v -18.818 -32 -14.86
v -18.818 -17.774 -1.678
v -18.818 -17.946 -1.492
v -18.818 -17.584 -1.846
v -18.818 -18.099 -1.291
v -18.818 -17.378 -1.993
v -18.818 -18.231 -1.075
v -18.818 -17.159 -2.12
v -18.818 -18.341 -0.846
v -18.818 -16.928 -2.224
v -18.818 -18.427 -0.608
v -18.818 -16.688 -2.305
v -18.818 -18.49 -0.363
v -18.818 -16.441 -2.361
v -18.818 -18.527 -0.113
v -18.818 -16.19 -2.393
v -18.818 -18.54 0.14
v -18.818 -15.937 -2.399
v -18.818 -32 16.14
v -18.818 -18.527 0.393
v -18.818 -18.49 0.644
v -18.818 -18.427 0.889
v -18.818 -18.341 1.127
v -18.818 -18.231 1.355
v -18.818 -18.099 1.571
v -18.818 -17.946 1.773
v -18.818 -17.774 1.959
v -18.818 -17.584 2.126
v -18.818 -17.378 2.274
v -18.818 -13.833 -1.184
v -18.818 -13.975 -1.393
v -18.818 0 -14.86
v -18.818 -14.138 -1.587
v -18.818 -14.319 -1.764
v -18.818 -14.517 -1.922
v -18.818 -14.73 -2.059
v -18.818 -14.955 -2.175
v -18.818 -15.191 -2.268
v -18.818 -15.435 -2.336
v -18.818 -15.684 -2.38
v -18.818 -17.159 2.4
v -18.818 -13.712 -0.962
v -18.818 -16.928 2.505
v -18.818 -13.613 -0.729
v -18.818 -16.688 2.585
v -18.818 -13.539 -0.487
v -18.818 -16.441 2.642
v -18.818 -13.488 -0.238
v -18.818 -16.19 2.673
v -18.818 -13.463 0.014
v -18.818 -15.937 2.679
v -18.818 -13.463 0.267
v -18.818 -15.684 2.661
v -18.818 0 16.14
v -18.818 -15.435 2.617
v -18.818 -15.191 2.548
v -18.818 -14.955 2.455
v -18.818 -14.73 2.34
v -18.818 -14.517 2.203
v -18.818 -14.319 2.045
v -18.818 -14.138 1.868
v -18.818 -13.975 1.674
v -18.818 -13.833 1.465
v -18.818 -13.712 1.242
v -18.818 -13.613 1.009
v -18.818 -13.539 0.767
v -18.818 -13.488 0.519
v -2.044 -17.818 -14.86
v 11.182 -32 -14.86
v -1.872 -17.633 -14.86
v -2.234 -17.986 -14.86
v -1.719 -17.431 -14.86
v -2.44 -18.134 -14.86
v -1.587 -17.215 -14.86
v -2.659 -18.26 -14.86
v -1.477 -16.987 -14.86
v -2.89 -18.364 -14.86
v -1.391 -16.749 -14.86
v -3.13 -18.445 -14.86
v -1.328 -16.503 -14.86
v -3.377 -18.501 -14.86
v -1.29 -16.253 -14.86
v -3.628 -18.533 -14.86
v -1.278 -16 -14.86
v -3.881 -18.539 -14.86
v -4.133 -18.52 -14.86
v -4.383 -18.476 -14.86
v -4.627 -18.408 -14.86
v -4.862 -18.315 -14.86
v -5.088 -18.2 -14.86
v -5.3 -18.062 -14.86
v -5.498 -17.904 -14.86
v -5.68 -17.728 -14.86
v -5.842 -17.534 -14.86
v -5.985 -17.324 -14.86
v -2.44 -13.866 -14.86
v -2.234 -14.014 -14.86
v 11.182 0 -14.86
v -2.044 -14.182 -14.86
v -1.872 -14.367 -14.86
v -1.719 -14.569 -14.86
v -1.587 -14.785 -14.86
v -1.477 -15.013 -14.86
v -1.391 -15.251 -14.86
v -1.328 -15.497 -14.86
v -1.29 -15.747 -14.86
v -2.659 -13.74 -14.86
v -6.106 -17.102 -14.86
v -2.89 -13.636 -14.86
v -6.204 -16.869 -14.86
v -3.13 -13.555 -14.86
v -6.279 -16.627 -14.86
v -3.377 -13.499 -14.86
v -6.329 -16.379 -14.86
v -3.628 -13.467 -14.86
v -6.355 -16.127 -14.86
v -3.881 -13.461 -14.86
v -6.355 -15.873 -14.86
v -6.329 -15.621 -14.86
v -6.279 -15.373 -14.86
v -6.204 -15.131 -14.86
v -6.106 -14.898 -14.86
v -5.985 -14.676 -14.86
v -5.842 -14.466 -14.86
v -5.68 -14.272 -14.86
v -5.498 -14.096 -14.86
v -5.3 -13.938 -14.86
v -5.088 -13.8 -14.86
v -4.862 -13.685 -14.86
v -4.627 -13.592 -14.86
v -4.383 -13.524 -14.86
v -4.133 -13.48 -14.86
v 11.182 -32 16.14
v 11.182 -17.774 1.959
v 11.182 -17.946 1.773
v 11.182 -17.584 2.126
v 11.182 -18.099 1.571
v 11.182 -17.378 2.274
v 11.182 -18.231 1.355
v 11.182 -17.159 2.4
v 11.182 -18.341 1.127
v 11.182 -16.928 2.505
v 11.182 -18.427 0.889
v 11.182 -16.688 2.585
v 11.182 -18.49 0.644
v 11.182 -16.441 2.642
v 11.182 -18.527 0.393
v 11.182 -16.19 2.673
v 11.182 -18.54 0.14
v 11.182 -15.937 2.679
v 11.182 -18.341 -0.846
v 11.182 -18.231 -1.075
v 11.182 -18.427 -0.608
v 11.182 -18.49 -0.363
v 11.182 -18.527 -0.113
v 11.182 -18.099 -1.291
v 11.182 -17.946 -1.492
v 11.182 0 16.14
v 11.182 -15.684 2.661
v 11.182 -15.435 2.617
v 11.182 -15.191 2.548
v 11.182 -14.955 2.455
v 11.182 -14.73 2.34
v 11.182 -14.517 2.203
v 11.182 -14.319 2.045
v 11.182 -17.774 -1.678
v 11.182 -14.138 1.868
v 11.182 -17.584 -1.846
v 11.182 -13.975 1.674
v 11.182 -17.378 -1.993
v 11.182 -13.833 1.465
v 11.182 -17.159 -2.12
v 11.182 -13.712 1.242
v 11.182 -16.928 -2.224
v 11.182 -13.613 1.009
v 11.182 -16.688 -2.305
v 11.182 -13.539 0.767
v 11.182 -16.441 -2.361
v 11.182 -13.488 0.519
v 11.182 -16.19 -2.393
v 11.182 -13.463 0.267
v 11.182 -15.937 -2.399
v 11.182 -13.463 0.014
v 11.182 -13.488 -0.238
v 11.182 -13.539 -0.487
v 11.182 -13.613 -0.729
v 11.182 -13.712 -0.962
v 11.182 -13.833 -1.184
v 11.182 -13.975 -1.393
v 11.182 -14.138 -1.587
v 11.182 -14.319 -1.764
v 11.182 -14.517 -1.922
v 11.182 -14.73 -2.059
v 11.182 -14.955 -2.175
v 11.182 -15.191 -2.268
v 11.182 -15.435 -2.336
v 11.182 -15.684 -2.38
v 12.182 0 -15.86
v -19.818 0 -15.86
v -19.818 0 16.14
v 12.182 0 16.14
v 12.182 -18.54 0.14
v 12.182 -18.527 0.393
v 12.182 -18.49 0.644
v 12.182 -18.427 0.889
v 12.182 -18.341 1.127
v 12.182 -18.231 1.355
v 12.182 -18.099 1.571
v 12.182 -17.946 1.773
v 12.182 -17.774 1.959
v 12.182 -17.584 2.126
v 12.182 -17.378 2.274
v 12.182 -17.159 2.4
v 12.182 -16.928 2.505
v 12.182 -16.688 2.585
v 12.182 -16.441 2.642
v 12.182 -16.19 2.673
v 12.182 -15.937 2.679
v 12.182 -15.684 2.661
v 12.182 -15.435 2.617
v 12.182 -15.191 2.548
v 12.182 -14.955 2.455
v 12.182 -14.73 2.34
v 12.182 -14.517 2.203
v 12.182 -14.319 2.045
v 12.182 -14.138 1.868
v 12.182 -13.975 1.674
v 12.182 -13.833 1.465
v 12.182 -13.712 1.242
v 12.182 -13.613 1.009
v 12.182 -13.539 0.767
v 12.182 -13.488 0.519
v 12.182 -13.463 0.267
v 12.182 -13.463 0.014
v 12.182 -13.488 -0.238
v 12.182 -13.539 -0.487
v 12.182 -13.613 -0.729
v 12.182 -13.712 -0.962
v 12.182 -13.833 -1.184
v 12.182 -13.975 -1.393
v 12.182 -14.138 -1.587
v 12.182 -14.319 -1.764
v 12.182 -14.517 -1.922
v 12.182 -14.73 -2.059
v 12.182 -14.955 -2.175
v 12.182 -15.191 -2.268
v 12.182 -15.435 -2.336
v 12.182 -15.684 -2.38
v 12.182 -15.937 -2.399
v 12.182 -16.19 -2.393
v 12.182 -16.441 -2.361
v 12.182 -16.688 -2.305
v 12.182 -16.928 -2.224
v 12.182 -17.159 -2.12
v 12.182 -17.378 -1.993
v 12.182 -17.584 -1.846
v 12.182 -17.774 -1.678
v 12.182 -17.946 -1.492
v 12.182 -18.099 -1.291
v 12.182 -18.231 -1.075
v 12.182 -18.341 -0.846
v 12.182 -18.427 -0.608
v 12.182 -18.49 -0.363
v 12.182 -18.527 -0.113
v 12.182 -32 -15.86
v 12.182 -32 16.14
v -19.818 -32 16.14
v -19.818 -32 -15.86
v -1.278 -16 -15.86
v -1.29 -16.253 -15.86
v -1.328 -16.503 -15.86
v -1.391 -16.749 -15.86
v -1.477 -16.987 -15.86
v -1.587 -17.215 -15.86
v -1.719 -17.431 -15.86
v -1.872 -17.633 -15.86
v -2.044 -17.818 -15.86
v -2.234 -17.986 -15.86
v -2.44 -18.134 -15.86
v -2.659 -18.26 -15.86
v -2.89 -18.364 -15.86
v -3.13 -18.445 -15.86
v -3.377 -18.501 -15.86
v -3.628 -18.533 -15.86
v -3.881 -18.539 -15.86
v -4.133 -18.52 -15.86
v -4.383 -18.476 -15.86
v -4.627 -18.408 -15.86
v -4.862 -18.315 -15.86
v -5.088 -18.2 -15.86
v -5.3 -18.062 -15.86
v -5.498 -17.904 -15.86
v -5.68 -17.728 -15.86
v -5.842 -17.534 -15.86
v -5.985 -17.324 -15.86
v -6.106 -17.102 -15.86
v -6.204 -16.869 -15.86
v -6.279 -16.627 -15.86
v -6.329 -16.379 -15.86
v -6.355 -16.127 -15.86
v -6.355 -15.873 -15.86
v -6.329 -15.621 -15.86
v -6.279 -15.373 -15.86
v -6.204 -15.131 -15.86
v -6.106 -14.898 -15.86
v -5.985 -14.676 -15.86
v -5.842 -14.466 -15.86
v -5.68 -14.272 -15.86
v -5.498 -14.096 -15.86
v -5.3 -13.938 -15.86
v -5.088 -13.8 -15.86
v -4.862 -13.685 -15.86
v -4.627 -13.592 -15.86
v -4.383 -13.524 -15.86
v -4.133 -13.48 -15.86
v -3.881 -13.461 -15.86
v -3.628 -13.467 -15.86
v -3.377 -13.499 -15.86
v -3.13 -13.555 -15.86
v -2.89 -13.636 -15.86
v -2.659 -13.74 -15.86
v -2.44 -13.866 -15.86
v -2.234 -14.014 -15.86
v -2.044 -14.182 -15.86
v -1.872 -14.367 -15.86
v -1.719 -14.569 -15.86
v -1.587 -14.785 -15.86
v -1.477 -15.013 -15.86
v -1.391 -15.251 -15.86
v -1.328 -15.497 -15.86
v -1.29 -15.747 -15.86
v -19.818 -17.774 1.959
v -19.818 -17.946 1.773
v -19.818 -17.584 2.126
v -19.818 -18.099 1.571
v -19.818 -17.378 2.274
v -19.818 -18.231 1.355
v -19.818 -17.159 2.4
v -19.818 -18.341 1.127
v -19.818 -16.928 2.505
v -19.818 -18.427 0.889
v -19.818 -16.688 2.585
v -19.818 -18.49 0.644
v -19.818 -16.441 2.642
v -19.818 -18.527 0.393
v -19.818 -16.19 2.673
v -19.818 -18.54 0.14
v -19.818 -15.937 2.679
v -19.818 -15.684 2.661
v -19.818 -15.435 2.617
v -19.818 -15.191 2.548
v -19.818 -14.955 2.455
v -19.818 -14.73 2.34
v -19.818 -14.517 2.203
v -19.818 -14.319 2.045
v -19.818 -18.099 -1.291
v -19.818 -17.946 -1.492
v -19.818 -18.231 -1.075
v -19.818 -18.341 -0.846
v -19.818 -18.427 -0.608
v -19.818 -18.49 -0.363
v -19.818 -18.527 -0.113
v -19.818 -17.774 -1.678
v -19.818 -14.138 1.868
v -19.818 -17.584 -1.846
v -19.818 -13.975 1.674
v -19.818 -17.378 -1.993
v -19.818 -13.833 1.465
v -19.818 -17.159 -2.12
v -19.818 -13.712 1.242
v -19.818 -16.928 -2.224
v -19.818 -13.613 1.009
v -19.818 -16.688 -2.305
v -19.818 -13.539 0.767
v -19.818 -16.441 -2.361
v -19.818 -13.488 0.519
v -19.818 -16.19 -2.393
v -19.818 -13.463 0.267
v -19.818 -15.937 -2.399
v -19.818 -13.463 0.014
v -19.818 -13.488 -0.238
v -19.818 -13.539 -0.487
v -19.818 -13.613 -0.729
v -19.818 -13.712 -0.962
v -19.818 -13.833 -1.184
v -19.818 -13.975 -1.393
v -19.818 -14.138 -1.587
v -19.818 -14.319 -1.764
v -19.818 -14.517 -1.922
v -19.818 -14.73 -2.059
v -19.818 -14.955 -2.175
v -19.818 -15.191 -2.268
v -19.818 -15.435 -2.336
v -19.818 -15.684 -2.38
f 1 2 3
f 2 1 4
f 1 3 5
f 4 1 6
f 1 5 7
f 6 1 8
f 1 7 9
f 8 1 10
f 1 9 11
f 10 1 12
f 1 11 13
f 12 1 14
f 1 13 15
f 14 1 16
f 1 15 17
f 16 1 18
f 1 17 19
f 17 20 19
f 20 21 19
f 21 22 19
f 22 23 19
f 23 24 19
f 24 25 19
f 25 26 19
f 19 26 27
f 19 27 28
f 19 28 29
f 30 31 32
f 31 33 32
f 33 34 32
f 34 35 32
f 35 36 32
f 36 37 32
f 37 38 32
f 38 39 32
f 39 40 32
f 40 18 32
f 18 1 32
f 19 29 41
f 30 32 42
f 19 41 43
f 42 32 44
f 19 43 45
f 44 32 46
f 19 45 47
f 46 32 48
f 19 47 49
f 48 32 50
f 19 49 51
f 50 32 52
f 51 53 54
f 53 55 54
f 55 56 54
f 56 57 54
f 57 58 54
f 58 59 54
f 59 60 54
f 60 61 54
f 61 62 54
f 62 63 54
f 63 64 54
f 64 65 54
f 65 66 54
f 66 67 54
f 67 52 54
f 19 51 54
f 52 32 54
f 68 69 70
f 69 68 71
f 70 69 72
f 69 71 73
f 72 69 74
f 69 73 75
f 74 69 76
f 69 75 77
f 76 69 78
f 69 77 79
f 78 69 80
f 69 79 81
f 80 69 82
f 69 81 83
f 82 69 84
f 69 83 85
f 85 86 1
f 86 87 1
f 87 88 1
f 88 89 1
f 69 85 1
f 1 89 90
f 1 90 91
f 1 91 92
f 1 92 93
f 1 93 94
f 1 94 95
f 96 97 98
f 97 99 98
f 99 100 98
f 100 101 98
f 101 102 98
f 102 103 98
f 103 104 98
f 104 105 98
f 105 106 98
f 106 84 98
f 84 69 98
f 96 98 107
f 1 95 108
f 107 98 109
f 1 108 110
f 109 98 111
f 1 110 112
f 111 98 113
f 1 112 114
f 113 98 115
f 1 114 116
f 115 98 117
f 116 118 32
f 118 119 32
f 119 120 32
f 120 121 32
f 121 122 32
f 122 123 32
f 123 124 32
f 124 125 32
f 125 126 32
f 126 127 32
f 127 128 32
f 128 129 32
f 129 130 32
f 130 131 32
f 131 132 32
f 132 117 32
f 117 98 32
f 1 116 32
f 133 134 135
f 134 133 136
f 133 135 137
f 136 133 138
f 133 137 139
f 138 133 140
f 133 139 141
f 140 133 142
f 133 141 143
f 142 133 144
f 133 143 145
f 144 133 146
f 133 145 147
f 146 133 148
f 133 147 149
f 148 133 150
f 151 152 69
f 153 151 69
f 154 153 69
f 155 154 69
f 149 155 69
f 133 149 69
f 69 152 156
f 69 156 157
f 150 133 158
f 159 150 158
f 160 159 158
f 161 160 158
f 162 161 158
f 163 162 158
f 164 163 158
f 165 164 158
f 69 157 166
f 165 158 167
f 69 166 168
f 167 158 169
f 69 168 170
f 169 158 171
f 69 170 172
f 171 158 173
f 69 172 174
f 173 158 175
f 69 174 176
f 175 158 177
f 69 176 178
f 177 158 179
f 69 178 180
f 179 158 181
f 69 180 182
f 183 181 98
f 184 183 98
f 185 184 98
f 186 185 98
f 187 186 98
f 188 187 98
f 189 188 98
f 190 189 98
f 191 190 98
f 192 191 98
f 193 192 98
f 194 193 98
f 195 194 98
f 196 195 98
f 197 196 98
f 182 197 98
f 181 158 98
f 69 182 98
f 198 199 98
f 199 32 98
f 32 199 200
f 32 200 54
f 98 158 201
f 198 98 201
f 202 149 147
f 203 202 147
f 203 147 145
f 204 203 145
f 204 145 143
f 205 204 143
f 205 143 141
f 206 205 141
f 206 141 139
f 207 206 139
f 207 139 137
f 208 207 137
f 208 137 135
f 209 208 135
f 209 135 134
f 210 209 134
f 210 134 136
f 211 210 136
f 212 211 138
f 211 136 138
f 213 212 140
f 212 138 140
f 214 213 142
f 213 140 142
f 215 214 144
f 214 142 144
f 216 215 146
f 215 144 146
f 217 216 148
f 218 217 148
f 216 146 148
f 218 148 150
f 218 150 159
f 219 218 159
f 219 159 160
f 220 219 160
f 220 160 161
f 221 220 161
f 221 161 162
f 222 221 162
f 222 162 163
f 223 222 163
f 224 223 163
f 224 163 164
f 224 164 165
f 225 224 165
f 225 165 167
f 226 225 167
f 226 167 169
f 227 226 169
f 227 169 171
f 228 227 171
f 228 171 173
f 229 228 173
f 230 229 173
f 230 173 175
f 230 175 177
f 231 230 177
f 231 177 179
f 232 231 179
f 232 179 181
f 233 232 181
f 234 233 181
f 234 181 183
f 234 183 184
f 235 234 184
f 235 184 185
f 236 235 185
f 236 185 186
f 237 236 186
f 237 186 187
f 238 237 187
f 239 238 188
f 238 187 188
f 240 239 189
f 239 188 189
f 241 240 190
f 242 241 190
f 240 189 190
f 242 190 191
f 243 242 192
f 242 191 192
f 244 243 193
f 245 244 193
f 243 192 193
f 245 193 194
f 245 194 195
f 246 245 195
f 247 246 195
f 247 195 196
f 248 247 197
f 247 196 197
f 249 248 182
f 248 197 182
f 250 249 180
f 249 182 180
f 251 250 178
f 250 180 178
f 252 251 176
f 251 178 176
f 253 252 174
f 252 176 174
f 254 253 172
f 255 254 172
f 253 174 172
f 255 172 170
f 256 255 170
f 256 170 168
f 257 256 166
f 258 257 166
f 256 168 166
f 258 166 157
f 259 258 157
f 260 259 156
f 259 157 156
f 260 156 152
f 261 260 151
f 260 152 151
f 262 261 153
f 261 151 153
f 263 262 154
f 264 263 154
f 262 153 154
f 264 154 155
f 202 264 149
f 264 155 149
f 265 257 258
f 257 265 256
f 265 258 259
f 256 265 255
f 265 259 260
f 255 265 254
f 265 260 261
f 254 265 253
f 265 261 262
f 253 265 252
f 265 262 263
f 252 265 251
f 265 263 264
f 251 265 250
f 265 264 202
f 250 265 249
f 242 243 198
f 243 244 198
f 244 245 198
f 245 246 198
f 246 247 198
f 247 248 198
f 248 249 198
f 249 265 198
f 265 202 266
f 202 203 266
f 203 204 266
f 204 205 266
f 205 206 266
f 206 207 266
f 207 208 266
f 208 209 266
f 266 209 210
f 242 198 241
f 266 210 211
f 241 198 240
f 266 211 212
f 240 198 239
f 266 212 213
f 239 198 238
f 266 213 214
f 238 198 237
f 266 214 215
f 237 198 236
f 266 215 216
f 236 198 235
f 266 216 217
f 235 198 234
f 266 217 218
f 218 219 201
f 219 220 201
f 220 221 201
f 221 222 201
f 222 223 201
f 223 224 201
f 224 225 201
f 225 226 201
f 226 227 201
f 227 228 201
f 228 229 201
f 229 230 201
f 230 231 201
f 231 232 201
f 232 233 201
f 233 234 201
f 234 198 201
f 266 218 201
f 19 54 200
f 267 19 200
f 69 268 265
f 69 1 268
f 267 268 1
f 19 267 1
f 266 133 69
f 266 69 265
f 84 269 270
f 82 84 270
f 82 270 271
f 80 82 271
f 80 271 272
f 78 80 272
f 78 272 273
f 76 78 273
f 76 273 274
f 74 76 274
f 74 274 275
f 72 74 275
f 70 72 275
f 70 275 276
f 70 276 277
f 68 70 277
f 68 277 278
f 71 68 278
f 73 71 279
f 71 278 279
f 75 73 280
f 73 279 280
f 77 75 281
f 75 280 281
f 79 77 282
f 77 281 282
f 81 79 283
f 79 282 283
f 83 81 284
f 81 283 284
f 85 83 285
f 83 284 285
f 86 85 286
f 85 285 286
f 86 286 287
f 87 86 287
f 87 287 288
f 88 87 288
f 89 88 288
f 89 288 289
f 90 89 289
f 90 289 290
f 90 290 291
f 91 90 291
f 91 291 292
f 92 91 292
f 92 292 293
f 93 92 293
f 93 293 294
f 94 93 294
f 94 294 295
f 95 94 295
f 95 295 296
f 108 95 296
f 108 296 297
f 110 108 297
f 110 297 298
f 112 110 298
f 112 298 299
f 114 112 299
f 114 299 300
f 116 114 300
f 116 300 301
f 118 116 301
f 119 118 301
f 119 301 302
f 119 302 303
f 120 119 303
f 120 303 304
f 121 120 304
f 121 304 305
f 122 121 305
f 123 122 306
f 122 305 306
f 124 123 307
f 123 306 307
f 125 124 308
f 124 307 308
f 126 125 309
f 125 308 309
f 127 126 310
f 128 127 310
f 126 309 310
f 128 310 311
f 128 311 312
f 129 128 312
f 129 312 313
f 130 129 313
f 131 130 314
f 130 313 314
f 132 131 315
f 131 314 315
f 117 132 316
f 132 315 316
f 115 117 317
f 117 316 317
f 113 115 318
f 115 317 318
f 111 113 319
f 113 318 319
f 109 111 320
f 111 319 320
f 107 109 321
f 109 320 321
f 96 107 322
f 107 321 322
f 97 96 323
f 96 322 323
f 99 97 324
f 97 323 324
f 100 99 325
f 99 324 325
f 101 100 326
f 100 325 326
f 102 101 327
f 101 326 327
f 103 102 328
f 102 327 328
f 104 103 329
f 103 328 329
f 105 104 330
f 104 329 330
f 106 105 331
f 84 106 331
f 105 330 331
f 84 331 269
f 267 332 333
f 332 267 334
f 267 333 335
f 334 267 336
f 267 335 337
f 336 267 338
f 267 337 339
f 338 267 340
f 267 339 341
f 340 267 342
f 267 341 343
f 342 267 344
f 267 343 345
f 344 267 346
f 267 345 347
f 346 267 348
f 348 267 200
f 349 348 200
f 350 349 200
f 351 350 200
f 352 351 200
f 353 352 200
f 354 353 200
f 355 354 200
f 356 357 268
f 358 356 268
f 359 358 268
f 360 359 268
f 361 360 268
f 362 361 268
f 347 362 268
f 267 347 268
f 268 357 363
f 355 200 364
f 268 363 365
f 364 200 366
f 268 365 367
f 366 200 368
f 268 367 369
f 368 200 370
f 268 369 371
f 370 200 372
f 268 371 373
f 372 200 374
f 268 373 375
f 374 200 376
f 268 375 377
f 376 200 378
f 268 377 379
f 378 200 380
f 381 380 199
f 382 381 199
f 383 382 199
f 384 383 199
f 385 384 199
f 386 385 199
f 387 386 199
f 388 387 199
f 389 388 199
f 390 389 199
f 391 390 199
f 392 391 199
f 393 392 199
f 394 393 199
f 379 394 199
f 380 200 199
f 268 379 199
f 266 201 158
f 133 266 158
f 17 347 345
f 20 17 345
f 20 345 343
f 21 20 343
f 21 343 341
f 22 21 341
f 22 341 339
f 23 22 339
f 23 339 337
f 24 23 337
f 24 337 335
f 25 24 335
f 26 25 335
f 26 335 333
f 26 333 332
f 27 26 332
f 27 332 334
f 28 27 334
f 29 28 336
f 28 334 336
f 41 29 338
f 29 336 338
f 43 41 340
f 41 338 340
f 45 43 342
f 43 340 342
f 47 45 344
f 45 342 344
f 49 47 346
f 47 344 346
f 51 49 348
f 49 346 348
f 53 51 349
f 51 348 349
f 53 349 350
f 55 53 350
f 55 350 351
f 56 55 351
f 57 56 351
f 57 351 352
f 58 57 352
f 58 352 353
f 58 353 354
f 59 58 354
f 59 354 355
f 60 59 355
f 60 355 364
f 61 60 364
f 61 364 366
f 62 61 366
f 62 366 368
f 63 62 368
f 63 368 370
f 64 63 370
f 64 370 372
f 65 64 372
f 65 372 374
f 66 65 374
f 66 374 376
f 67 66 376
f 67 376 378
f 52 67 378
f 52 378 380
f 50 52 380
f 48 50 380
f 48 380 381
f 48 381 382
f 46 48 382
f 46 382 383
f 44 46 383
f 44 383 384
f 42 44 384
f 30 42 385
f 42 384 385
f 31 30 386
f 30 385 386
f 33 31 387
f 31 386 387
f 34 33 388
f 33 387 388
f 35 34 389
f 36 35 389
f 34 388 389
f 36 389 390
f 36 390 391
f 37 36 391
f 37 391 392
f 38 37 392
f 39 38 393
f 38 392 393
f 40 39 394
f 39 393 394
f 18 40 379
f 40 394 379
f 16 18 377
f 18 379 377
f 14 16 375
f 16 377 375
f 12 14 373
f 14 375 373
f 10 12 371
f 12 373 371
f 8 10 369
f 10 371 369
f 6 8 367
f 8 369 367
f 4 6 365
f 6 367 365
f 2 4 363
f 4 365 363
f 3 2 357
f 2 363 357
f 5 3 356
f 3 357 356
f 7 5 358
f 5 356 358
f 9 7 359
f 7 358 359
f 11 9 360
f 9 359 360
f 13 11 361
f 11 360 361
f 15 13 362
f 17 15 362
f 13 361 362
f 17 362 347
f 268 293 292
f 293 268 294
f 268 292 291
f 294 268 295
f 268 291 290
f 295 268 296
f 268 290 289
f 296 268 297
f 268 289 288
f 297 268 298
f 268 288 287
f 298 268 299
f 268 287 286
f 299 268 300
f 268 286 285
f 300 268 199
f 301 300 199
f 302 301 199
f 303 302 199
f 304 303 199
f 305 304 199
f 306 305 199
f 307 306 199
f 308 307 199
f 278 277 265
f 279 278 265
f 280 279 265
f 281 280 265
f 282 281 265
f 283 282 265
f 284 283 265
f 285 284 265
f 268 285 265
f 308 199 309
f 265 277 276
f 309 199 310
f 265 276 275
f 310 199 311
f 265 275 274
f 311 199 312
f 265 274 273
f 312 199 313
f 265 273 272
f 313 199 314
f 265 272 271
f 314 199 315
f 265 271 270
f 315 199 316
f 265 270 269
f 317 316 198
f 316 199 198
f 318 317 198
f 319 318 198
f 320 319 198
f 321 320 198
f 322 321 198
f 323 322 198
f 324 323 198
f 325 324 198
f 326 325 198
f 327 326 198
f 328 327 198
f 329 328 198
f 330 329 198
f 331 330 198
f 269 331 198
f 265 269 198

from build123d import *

# Parameters (mm, degrees)
F1_DEPTH = 32
F2_R     = 2.54
F3_DEPTH = 76.2
F4_R     = 2.54
F5_DEPTH = 25.4


with BuildPart() as f1:
    # F0 (on Front) → F1 (new body)
    with BuildSketch(Plane.XZ):
        Polygon((-18.817659, 16.140222), (-19.817659, 16.140222), (-19.817659, -15.859778), (12.182341, -15.859778), (12.182341, 16.140222), (11.182341, 16.140222), (11.182341, -14.859778), (-18.817659, -14.859778), align=None)
    extrude(amount=F1_DEPTH)

    # F2 (on face) → F3 (cut)
    with BuildSketch(Plane(origin=(-19.817659, 0, 0), x_dir=(0, -1, 0), z_dir=(-1, 0, 0))):
        with Locations((16, 0.140222)):
            Circle(F2_R)
    extrude(amount=-F3_DEPTH, mode=Mode.SUBTRACT)

    # F4 (on face) → F5 (cut)
    with BuildSketch(Plane(origin=(0, 0, -15.859778), x_dir=(1, 0, 0), z_dir=(0, 0, -1))):
        with Locations((-3.817659, 16)):
            Circle(F4_R)
    extrude(amount=-F5_DEPTH, mode=Mode.SUBTRACT)


solid = f1.part
